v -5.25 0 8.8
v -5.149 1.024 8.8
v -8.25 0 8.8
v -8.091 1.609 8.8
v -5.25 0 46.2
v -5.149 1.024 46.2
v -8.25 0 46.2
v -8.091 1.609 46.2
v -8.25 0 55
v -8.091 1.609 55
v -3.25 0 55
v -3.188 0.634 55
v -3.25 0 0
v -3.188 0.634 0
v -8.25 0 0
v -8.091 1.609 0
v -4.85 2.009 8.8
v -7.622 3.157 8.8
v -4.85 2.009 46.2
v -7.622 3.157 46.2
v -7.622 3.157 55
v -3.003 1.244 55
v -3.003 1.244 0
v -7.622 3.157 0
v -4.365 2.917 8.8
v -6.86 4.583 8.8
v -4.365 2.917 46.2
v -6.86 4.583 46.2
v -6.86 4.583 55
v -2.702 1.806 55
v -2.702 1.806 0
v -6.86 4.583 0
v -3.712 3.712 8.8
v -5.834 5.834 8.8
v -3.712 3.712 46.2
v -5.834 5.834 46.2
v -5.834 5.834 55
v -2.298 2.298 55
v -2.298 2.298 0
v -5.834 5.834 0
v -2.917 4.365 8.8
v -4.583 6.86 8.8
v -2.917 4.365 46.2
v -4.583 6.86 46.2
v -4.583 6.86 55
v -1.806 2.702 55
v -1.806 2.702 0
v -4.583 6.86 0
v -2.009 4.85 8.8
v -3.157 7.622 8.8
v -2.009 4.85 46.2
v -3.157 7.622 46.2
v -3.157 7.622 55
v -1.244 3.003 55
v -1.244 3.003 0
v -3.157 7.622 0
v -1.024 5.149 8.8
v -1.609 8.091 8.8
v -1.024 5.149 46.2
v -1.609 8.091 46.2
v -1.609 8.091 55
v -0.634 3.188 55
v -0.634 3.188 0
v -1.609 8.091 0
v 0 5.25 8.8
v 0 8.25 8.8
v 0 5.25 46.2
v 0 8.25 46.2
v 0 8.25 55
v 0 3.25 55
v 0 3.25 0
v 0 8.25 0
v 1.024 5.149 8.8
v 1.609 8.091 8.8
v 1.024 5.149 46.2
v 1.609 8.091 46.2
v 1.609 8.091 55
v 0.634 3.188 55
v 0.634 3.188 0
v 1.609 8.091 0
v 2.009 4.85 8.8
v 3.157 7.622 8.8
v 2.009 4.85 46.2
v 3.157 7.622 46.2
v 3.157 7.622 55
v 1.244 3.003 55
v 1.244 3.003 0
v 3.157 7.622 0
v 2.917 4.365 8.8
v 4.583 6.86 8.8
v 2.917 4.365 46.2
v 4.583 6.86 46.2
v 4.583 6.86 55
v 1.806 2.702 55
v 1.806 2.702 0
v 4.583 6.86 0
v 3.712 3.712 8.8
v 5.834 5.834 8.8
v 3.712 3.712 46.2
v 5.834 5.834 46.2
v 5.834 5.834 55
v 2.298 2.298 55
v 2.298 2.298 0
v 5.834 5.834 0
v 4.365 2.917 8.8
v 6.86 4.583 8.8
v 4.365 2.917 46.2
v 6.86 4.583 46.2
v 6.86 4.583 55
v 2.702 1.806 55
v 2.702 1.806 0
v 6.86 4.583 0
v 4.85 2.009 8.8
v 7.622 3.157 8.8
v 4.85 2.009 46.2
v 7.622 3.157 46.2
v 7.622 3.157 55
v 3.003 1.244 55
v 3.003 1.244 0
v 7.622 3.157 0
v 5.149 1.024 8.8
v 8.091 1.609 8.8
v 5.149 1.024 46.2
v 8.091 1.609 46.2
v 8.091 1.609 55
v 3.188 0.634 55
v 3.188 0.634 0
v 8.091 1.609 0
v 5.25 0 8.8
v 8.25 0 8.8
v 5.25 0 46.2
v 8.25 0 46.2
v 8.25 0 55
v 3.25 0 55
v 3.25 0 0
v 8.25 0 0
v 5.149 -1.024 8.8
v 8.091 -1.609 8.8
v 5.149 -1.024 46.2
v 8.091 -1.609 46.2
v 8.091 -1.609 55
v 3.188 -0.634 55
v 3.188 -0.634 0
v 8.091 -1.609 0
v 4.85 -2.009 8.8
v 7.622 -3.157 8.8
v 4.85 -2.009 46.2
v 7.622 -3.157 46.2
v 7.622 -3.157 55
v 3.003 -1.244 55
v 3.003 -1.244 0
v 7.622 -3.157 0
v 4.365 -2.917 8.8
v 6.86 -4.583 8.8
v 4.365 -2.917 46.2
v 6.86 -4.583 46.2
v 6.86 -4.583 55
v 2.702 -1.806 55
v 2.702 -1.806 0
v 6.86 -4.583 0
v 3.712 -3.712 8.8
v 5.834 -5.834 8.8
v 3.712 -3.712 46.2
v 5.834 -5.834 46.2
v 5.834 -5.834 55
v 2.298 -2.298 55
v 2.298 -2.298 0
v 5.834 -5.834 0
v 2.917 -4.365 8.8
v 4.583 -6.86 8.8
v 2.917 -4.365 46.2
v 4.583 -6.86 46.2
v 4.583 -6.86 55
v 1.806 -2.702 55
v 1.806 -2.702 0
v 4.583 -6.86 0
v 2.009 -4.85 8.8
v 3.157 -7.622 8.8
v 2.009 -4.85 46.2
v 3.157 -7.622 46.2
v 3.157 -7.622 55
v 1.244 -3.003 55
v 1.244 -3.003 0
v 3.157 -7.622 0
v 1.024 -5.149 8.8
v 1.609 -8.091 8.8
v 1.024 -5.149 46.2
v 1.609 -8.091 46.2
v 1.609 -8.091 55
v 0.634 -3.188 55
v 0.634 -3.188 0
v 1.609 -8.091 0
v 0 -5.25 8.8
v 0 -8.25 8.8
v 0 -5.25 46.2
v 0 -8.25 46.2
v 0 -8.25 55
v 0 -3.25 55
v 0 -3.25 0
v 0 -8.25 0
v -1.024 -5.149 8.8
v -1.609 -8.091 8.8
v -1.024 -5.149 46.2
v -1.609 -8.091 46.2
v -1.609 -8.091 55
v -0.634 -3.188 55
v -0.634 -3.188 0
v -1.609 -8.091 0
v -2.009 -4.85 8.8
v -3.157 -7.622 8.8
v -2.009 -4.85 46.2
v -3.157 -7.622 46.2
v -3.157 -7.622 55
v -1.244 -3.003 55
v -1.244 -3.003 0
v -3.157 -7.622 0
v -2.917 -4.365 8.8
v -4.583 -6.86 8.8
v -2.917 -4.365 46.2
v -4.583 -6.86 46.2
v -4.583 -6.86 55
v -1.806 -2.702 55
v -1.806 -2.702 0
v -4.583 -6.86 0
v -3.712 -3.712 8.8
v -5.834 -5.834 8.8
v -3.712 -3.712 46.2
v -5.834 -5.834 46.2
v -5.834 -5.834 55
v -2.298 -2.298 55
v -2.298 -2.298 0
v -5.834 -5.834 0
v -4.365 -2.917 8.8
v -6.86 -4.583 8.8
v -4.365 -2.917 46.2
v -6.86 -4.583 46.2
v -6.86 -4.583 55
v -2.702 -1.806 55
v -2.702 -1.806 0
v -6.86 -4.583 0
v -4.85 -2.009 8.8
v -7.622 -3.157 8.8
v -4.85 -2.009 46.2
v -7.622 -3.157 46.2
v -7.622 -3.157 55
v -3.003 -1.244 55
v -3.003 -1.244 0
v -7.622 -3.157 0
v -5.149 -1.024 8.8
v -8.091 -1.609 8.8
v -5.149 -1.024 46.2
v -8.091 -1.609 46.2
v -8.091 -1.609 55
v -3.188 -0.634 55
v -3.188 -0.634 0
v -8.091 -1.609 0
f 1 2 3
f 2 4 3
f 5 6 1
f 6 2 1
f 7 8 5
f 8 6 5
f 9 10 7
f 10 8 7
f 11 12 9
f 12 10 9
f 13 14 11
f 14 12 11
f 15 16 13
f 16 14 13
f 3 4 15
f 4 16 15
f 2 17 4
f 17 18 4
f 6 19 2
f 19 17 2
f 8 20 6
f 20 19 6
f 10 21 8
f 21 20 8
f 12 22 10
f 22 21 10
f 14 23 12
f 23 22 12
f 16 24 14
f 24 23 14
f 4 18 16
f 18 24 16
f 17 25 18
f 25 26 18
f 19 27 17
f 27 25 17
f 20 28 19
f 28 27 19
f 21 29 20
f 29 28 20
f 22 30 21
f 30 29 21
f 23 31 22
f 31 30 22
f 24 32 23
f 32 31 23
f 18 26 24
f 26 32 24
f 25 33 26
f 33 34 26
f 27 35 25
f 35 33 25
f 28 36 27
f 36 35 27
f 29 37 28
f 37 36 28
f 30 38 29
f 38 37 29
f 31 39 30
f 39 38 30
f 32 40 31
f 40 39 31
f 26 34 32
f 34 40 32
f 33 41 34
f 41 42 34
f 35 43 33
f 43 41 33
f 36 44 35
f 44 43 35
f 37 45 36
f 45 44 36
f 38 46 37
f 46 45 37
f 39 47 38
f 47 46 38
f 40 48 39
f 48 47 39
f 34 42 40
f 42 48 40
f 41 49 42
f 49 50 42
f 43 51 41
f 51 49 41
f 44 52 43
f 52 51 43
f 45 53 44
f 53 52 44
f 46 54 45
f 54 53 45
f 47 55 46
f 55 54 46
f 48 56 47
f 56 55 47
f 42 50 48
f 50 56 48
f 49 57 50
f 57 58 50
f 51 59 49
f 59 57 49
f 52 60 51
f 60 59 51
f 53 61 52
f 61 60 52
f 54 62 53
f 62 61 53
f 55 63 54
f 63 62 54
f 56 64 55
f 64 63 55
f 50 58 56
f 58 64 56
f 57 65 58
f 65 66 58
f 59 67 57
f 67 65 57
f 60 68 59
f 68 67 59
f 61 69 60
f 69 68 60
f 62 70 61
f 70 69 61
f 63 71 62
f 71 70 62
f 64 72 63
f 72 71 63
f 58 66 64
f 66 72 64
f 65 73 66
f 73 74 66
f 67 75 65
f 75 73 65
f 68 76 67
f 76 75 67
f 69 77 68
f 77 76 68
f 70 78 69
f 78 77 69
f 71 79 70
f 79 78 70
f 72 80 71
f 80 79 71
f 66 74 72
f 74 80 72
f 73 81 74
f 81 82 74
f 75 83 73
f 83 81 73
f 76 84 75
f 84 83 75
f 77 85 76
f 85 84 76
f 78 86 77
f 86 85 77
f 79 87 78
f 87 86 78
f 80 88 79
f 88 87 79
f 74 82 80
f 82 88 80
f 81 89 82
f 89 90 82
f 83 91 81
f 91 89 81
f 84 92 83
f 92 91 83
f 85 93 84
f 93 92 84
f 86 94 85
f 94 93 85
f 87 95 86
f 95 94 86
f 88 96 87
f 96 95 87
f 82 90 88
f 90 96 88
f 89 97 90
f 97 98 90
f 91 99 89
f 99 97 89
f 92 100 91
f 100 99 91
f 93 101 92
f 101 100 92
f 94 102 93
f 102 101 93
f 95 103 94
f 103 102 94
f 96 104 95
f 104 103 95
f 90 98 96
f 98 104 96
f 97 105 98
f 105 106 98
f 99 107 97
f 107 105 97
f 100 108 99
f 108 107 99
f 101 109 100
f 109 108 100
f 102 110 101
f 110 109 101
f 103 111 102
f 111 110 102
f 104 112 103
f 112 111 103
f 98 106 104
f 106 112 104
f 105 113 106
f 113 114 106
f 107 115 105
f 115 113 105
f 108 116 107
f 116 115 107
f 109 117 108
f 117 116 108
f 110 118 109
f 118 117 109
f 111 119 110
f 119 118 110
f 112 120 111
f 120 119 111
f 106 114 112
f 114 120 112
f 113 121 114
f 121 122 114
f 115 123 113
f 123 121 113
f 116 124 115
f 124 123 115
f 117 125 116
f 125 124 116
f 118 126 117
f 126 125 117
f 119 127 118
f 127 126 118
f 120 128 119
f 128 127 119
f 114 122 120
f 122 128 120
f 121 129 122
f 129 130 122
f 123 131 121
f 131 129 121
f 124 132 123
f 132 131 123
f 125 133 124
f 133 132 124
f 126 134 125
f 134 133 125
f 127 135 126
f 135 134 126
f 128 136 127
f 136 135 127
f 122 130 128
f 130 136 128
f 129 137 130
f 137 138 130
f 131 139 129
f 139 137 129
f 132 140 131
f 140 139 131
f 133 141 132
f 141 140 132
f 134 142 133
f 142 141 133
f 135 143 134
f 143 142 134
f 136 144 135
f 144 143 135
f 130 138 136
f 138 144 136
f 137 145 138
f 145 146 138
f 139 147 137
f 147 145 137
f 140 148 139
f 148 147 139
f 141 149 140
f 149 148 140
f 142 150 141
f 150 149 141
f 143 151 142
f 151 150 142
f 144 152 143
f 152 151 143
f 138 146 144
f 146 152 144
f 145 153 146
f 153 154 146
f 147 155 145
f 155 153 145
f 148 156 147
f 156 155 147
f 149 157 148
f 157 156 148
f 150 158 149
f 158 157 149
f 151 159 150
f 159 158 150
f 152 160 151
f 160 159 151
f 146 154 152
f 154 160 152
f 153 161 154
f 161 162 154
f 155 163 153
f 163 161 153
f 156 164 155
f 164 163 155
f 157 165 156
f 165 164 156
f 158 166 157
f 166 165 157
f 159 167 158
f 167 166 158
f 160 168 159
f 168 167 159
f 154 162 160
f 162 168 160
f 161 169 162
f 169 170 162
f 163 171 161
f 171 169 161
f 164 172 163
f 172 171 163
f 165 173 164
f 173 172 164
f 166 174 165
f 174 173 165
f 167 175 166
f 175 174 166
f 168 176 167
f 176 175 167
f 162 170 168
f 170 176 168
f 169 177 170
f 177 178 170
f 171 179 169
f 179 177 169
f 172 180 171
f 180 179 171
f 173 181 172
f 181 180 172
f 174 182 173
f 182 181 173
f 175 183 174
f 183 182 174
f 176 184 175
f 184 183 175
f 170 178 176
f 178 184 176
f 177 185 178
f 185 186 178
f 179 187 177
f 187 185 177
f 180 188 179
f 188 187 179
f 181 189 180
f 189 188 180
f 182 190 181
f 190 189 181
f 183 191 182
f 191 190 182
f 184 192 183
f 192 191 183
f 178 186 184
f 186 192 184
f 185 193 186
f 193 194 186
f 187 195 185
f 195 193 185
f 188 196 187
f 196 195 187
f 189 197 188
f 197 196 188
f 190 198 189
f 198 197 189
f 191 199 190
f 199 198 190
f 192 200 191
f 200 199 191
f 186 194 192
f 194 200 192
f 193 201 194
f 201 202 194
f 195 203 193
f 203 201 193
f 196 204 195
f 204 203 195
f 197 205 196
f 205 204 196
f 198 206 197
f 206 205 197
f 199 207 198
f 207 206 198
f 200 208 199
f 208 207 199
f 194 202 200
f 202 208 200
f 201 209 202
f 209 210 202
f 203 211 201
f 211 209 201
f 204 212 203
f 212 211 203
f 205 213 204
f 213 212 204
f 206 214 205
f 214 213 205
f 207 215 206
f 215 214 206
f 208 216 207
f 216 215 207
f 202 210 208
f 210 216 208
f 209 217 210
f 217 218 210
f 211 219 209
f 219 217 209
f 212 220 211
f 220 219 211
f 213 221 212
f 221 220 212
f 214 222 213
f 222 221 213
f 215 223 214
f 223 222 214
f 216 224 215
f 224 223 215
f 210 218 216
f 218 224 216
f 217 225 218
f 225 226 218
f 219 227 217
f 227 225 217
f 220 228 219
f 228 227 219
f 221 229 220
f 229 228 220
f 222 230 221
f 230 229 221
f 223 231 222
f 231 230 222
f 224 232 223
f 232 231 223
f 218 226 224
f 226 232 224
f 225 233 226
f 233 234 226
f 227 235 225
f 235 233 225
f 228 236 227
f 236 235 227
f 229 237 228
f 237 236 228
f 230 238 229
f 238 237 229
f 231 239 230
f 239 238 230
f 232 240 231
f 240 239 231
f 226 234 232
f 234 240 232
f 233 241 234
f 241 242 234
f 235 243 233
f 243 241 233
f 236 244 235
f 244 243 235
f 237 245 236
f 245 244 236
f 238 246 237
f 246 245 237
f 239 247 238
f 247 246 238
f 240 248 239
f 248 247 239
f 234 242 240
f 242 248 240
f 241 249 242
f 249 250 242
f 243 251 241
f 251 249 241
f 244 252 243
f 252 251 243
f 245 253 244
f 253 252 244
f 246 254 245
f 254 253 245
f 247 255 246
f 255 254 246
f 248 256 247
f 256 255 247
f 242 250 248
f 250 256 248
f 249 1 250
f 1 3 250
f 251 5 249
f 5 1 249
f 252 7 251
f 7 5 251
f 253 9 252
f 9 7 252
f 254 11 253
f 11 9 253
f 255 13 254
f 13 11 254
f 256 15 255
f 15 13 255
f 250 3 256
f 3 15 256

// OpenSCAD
$fn = 32;

// ----------------------------------------------------------------------
// Profiled standoff: spool spacer, 55 mm long, bore 6.5 mm
// ----------------------------------------------------------------------

// --- parameters (mm) ---
revolve_angle = 360;      // full turn around the Z axis
profile_points = 8;       // points of the closed outline

profile = [[3.25, 0], [8.25, 0], [8.25, 8.8], [5.25, 8.8], [5.25, 46.2], [8.25, 46.2], [8.25, 55], [3.25, 55]];  // single closed polygon, 8 points, counter clockwise

// --- the one profile operation ---
rotate_extrude(angle = revolve_angle) polygon(points = profile);
